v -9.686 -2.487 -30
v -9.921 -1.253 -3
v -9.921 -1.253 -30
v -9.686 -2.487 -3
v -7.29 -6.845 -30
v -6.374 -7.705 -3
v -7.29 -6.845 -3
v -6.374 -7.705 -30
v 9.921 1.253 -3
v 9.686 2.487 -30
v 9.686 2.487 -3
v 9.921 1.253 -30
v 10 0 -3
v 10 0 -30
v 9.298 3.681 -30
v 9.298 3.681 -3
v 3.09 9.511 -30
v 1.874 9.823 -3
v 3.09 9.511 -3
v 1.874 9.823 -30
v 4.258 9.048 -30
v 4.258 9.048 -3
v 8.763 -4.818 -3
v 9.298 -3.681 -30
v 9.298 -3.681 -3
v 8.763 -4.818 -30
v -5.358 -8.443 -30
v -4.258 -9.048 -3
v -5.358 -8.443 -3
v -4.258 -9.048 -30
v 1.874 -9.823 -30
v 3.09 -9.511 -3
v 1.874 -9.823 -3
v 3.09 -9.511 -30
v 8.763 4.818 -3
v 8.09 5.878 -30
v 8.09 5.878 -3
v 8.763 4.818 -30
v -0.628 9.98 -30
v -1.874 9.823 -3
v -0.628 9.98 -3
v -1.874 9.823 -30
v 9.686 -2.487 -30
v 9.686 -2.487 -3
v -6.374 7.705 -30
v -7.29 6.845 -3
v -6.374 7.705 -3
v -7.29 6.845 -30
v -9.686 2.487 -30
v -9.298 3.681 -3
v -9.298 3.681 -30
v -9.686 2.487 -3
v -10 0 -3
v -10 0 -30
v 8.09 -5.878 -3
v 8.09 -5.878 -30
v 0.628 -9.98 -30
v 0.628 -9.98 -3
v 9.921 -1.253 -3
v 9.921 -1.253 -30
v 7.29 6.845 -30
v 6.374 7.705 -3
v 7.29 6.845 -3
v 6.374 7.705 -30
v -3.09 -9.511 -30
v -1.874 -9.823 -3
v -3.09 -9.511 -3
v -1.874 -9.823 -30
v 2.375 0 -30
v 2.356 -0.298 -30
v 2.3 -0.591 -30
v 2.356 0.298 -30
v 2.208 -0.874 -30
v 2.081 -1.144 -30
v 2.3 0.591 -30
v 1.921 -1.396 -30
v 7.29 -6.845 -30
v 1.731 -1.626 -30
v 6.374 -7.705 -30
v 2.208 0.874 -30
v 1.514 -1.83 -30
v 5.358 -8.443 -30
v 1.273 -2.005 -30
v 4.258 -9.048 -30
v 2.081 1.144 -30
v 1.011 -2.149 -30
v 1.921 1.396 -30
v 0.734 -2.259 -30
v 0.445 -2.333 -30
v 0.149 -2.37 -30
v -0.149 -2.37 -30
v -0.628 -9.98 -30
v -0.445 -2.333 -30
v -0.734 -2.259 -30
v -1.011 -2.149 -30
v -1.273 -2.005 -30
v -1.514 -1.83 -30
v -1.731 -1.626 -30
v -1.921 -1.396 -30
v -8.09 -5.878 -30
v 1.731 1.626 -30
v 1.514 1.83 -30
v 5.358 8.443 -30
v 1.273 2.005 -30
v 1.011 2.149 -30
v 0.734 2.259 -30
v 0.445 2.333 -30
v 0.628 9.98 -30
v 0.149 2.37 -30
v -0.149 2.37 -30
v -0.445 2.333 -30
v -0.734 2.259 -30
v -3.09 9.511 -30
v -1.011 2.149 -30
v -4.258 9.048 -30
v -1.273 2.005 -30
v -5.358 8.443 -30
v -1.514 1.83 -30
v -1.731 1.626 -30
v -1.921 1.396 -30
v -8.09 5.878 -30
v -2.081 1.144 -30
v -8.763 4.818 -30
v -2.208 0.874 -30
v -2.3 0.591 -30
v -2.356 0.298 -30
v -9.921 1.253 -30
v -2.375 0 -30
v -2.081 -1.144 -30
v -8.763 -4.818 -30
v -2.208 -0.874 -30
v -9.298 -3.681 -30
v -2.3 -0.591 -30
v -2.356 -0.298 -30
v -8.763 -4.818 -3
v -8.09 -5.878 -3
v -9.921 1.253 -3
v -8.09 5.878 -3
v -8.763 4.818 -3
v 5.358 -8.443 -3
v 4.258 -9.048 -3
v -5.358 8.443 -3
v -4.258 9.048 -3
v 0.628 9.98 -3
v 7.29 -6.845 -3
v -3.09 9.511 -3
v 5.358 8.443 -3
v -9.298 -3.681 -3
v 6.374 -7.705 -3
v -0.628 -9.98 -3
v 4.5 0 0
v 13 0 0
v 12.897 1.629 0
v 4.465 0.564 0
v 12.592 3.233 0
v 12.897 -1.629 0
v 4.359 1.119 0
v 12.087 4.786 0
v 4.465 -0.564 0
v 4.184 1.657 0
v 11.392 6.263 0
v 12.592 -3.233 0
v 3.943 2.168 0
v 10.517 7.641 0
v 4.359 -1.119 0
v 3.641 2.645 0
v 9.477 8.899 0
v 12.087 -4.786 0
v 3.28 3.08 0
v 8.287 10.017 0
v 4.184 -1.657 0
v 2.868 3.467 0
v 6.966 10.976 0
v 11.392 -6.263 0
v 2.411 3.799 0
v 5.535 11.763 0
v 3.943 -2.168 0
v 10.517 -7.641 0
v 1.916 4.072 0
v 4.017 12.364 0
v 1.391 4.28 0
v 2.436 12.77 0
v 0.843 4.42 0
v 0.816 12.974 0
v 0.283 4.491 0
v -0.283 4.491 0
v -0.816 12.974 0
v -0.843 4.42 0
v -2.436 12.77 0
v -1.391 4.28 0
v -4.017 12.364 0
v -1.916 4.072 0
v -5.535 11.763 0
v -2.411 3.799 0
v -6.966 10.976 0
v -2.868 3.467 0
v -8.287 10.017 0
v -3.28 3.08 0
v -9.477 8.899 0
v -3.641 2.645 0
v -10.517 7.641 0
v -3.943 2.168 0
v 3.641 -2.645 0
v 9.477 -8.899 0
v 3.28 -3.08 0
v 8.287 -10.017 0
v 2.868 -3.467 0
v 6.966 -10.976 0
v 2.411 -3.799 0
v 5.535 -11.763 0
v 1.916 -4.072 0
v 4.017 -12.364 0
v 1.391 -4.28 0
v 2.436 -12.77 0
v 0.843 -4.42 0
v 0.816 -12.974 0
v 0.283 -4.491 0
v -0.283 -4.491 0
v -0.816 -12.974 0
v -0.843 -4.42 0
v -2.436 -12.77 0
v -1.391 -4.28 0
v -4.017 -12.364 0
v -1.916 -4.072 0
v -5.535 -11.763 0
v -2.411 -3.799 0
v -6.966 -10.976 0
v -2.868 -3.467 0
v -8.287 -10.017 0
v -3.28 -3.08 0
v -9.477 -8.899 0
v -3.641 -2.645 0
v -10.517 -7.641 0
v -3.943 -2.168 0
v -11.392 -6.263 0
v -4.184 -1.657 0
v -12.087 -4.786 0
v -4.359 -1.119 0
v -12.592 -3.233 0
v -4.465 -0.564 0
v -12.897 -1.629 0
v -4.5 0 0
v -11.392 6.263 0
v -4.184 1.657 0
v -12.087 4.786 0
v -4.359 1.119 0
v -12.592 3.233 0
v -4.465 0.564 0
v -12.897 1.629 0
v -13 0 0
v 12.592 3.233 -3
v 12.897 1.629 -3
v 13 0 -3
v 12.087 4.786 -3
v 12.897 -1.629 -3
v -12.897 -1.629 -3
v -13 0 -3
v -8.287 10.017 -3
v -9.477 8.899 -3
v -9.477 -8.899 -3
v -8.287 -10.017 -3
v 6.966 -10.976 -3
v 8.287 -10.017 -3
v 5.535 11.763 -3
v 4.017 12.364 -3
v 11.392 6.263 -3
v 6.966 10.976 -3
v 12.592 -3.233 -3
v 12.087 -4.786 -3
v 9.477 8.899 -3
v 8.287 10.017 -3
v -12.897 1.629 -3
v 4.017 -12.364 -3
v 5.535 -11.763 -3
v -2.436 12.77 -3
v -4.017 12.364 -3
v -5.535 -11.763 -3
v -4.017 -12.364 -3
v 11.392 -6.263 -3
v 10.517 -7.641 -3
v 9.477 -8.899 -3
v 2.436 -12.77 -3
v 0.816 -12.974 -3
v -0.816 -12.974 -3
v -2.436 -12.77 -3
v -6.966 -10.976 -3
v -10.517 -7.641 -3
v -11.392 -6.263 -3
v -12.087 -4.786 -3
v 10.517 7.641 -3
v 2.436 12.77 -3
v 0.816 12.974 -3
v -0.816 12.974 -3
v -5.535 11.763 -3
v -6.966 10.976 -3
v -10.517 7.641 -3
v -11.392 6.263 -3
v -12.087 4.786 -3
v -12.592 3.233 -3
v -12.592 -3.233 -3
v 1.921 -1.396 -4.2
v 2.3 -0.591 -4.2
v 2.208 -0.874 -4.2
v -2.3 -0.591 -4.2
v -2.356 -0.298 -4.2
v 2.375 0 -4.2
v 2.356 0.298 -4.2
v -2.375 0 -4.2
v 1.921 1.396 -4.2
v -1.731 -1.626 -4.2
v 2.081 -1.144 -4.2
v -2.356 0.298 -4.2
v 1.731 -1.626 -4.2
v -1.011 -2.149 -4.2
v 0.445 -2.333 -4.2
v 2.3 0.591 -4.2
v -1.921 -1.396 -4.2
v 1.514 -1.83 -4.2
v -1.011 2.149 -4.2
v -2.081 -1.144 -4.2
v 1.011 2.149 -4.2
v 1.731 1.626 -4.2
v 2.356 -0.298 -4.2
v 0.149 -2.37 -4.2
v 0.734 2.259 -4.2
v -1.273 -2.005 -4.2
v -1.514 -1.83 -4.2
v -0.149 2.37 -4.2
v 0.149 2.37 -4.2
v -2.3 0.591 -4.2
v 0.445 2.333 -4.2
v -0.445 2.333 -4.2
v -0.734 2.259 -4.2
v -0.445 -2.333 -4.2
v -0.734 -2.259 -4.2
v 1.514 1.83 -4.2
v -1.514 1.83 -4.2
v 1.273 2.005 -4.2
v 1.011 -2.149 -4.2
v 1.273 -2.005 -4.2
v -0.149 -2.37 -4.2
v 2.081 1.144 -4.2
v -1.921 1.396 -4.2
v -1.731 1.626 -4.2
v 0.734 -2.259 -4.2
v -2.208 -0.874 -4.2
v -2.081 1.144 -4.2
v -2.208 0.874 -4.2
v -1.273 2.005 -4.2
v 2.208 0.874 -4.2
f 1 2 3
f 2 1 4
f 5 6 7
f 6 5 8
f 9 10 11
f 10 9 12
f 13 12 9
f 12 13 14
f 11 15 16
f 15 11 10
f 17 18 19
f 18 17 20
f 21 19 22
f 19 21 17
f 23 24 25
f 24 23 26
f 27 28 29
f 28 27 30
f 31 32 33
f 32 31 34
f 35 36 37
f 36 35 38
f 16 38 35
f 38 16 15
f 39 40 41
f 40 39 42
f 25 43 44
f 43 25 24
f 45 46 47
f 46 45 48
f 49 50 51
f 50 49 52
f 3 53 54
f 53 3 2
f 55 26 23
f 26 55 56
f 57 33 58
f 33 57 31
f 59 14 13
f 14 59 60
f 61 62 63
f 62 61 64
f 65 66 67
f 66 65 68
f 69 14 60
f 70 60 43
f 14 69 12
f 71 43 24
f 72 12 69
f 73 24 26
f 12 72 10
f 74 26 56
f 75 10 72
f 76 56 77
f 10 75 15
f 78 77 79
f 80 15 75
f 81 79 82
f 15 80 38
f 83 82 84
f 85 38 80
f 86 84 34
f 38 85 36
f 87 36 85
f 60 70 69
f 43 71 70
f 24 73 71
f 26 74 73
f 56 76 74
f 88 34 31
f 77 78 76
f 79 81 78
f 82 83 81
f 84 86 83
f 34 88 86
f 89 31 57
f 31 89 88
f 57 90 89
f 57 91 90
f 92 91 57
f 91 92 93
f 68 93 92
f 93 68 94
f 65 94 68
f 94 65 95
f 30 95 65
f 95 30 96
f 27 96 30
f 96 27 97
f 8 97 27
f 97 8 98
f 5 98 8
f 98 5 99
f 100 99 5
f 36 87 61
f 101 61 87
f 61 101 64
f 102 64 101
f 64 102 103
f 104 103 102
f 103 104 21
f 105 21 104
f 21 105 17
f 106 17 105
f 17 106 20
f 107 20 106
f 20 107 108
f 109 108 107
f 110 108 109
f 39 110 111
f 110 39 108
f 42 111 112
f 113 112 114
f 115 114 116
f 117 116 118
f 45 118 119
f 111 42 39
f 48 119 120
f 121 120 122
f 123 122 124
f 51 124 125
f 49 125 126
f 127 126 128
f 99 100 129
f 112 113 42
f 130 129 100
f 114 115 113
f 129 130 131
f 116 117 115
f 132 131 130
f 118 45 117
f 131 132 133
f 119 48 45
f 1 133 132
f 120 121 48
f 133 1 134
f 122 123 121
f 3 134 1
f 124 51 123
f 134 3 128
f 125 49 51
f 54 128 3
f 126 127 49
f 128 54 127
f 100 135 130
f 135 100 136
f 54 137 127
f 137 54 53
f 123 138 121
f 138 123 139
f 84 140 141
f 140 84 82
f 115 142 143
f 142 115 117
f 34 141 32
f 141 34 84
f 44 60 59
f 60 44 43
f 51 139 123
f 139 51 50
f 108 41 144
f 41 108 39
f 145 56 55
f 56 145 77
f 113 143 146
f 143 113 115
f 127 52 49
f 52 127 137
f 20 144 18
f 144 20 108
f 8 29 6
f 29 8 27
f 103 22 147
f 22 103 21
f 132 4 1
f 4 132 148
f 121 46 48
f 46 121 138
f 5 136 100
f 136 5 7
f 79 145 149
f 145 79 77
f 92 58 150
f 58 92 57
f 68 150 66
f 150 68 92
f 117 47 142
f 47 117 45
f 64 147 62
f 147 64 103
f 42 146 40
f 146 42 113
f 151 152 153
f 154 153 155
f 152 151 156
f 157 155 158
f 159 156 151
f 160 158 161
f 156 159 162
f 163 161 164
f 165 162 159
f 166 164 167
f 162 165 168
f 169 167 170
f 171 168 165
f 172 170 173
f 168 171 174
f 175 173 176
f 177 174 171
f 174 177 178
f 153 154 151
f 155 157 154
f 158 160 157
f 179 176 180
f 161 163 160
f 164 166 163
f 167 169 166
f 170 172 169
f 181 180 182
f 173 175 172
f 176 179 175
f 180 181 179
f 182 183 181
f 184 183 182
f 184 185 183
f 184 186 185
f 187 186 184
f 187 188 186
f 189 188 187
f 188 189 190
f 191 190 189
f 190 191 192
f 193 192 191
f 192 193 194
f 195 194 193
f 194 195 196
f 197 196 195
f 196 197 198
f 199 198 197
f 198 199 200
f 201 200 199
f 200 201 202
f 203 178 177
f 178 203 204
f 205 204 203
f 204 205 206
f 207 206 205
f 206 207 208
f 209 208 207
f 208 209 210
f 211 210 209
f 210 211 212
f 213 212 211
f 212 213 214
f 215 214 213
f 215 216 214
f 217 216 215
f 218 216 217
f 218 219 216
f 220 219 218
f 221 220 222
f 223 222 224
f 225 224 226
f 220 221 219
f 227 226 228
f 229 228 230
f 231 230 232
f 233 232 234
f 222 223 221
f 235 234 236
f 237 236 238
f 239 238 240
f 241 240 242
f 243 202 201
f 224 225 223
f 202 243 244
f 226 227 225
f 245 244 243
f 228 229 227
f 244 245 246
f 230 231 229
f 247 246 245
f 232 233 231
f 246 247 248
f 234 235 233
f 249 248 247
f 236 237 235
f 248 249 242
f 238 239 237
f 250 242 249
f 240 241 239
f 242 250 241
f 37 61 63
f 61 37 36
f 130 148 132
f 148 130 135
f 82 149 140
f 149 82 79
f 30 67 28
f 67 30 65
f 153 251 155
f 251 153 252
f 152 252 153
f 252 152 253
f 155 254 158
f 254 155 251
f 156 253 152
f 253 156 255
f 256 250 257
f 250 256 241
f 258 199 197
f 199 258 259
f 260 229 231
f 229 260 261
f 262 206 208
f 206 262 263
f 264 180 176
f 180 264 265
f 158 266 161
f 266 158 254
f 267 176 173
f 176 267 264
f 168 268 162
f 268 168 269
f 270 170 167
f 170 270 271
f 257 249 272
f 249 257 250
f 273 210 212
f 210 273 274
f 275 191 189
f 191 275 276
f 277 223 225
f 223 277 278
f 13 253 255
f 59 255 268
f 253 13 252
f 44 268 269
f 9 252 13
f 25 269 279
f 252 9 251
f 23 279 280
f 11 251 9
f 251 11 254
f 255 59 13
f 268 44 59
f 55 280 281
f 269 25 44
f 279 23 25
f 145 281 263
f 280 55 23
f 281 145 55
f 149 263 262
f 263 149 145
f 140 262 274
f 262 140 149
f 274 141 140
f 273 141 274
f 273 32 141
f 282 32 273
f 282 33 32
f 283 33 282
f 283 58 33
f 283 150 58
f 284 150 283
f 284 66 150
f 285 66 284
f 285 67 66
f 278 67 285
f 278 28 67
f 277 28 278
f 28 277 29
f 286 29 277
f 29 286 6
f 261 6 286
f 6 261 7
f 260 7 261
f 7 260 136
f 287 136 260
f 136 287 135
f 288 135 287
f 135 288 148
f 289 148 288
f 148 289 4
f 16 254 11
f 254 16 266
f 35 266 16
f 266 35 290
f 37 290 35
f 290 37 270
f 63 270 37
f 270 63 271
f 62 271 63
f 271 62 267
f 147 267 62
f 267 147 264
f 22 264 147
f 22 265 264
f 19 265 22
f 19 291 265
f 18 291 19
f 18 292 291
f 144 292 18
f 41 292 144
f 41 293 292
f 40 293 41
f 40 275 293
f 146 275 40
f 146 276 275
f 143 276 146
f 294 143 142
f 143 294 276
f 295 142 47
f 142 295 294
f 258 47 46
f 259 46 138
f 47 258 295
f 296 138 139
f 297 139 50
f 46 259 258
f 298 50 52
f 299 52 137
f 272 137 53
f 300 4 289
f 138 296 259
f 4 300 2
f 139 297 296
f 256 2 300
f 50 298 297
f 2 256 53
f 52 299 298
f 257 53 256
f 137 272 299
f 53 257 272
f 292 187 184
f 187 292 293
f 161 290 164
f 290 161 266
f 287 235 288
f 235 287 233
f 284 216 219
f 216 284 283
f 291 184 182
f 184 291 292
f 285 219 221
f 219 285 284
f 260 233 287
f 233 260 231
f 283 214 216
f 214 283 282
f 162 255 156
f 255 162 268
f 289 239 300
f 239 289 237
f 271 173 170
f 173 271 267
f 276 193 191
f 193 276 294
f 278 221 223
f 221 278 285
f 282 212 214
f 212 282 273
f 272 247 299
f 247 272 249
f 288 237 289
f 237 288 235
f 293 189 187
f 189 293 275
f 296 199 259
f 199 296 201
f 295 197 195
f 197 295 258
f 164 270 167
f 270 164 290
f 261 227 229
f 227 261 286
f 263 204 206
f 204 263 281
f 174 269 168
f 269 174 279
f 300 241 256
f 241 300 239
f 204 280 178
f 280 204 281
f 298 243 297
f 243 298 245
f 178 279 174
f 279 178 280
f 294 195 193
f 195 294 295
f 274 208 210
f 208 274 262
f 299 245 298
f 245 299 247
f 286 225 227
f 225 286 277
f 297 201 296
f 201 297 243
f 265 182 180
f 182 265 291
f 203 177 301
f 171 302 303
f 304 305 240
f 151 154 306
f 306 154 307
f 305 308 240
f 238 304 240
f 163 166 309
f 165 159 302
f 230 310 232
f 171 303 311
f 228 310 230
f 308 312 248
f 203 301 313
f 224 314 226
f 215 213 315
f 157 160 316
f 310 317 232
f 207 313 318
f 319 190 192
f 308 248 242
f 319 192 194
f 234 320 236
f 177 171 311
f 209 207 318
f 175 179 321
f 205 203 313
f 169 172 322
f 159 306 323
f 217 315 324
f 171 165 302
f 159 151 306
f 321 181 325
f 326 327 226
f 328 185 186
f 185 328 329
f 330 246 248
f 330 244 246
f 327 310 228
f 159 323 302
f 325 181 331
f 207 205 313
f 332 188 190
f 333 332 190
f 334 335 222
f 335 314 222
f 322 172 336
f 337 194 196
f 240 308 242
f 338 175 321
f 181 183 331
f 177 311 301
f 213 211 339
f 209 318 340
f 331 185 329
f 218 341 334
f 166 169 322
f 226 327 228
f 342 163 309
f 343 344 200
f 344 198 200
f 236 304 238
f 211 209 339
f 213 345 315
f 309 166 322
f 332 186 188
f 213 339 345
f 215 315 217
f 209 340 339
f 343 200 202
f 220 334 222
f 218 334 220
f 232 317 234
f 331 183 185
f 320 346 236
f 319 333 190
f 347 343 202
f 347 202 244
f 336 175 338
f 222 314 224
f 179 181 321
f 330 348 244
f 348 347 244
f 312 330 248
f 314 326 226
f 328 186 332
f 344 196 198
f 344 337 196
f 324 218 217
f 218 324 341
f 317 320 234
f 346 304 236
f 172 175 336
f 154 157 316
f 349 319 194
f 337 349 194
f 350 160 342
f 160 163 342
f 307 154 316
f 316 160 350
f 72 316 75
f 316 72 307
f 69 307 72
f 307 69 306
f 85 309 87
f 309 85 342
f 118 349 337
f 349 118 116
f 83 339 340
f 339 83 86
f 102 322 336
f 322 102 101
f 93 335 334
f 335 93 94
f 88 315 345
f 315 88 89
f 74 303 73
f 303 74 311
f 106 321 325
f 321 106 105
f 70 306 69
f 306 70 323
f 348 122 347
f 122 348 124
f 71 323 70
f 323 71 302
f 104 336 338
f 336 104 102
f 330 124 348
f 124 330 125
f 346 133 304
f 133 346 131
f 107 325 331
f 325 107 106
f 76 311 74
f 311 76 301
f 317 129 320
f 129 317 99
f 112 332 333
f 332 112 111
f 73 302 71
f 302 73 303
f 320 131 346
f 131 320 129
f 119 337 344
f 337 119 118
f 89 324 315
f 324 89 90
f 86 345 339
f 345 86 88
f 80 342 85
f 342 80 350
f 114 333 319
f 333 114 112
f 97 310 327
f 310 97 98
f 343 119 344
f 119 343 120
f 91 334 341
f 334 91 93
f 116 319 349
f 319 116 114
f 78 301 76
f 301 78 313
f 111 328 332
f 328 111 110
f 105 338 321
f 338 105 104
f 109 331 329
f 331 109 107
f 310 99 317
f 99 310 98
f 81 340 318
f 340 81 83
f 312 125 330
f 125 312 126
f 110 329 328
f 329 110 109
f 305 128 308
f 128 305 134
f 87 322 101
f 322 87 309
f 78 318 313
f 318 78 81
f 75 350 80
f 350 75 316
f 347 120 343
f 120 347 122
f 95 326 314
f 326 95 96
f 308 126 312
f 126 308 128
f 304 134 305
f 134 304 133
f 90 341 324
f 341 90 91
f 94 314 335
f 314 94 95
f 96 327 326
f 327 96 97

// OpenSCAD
$fn = 50;


difference() {
	union() {
		translate(v = [0, 0, -30.0000000000]) {
			cylinder(h = 30, r = 10.0000000000);
		}
		translate(v = [0, 0, -3.0000000000]) {
			cylinder(h = 3, r = 13.0000000000);
		}
	}
	union() {
		translate(v = [0, 0, 0]) {
			rotate(a = [0, 0, 0]) {
				difference() {
					union() {
						#translate(v = [0, 0, -30.0000000000]) {
							cylinder(h = 30, r = 2.2500000000);
						}
						#translate(v = [0, 0, -4.2000000000]) {
							cylinder(h = 4.2000000000, r1 = 2.3750000000, r2 = 4.5000000000);
						}
						#translate(v = [0, 0, -30.0000000000]) {
							cylinder(h = 30, r = 2.3750000000);
						}
						#translate(v = [0, 0, -30.0000000000]) {
							cylinder(h = 30, r = 2.2500000000);
						}
					}
					union();
				}
			}
		}
	}
}
